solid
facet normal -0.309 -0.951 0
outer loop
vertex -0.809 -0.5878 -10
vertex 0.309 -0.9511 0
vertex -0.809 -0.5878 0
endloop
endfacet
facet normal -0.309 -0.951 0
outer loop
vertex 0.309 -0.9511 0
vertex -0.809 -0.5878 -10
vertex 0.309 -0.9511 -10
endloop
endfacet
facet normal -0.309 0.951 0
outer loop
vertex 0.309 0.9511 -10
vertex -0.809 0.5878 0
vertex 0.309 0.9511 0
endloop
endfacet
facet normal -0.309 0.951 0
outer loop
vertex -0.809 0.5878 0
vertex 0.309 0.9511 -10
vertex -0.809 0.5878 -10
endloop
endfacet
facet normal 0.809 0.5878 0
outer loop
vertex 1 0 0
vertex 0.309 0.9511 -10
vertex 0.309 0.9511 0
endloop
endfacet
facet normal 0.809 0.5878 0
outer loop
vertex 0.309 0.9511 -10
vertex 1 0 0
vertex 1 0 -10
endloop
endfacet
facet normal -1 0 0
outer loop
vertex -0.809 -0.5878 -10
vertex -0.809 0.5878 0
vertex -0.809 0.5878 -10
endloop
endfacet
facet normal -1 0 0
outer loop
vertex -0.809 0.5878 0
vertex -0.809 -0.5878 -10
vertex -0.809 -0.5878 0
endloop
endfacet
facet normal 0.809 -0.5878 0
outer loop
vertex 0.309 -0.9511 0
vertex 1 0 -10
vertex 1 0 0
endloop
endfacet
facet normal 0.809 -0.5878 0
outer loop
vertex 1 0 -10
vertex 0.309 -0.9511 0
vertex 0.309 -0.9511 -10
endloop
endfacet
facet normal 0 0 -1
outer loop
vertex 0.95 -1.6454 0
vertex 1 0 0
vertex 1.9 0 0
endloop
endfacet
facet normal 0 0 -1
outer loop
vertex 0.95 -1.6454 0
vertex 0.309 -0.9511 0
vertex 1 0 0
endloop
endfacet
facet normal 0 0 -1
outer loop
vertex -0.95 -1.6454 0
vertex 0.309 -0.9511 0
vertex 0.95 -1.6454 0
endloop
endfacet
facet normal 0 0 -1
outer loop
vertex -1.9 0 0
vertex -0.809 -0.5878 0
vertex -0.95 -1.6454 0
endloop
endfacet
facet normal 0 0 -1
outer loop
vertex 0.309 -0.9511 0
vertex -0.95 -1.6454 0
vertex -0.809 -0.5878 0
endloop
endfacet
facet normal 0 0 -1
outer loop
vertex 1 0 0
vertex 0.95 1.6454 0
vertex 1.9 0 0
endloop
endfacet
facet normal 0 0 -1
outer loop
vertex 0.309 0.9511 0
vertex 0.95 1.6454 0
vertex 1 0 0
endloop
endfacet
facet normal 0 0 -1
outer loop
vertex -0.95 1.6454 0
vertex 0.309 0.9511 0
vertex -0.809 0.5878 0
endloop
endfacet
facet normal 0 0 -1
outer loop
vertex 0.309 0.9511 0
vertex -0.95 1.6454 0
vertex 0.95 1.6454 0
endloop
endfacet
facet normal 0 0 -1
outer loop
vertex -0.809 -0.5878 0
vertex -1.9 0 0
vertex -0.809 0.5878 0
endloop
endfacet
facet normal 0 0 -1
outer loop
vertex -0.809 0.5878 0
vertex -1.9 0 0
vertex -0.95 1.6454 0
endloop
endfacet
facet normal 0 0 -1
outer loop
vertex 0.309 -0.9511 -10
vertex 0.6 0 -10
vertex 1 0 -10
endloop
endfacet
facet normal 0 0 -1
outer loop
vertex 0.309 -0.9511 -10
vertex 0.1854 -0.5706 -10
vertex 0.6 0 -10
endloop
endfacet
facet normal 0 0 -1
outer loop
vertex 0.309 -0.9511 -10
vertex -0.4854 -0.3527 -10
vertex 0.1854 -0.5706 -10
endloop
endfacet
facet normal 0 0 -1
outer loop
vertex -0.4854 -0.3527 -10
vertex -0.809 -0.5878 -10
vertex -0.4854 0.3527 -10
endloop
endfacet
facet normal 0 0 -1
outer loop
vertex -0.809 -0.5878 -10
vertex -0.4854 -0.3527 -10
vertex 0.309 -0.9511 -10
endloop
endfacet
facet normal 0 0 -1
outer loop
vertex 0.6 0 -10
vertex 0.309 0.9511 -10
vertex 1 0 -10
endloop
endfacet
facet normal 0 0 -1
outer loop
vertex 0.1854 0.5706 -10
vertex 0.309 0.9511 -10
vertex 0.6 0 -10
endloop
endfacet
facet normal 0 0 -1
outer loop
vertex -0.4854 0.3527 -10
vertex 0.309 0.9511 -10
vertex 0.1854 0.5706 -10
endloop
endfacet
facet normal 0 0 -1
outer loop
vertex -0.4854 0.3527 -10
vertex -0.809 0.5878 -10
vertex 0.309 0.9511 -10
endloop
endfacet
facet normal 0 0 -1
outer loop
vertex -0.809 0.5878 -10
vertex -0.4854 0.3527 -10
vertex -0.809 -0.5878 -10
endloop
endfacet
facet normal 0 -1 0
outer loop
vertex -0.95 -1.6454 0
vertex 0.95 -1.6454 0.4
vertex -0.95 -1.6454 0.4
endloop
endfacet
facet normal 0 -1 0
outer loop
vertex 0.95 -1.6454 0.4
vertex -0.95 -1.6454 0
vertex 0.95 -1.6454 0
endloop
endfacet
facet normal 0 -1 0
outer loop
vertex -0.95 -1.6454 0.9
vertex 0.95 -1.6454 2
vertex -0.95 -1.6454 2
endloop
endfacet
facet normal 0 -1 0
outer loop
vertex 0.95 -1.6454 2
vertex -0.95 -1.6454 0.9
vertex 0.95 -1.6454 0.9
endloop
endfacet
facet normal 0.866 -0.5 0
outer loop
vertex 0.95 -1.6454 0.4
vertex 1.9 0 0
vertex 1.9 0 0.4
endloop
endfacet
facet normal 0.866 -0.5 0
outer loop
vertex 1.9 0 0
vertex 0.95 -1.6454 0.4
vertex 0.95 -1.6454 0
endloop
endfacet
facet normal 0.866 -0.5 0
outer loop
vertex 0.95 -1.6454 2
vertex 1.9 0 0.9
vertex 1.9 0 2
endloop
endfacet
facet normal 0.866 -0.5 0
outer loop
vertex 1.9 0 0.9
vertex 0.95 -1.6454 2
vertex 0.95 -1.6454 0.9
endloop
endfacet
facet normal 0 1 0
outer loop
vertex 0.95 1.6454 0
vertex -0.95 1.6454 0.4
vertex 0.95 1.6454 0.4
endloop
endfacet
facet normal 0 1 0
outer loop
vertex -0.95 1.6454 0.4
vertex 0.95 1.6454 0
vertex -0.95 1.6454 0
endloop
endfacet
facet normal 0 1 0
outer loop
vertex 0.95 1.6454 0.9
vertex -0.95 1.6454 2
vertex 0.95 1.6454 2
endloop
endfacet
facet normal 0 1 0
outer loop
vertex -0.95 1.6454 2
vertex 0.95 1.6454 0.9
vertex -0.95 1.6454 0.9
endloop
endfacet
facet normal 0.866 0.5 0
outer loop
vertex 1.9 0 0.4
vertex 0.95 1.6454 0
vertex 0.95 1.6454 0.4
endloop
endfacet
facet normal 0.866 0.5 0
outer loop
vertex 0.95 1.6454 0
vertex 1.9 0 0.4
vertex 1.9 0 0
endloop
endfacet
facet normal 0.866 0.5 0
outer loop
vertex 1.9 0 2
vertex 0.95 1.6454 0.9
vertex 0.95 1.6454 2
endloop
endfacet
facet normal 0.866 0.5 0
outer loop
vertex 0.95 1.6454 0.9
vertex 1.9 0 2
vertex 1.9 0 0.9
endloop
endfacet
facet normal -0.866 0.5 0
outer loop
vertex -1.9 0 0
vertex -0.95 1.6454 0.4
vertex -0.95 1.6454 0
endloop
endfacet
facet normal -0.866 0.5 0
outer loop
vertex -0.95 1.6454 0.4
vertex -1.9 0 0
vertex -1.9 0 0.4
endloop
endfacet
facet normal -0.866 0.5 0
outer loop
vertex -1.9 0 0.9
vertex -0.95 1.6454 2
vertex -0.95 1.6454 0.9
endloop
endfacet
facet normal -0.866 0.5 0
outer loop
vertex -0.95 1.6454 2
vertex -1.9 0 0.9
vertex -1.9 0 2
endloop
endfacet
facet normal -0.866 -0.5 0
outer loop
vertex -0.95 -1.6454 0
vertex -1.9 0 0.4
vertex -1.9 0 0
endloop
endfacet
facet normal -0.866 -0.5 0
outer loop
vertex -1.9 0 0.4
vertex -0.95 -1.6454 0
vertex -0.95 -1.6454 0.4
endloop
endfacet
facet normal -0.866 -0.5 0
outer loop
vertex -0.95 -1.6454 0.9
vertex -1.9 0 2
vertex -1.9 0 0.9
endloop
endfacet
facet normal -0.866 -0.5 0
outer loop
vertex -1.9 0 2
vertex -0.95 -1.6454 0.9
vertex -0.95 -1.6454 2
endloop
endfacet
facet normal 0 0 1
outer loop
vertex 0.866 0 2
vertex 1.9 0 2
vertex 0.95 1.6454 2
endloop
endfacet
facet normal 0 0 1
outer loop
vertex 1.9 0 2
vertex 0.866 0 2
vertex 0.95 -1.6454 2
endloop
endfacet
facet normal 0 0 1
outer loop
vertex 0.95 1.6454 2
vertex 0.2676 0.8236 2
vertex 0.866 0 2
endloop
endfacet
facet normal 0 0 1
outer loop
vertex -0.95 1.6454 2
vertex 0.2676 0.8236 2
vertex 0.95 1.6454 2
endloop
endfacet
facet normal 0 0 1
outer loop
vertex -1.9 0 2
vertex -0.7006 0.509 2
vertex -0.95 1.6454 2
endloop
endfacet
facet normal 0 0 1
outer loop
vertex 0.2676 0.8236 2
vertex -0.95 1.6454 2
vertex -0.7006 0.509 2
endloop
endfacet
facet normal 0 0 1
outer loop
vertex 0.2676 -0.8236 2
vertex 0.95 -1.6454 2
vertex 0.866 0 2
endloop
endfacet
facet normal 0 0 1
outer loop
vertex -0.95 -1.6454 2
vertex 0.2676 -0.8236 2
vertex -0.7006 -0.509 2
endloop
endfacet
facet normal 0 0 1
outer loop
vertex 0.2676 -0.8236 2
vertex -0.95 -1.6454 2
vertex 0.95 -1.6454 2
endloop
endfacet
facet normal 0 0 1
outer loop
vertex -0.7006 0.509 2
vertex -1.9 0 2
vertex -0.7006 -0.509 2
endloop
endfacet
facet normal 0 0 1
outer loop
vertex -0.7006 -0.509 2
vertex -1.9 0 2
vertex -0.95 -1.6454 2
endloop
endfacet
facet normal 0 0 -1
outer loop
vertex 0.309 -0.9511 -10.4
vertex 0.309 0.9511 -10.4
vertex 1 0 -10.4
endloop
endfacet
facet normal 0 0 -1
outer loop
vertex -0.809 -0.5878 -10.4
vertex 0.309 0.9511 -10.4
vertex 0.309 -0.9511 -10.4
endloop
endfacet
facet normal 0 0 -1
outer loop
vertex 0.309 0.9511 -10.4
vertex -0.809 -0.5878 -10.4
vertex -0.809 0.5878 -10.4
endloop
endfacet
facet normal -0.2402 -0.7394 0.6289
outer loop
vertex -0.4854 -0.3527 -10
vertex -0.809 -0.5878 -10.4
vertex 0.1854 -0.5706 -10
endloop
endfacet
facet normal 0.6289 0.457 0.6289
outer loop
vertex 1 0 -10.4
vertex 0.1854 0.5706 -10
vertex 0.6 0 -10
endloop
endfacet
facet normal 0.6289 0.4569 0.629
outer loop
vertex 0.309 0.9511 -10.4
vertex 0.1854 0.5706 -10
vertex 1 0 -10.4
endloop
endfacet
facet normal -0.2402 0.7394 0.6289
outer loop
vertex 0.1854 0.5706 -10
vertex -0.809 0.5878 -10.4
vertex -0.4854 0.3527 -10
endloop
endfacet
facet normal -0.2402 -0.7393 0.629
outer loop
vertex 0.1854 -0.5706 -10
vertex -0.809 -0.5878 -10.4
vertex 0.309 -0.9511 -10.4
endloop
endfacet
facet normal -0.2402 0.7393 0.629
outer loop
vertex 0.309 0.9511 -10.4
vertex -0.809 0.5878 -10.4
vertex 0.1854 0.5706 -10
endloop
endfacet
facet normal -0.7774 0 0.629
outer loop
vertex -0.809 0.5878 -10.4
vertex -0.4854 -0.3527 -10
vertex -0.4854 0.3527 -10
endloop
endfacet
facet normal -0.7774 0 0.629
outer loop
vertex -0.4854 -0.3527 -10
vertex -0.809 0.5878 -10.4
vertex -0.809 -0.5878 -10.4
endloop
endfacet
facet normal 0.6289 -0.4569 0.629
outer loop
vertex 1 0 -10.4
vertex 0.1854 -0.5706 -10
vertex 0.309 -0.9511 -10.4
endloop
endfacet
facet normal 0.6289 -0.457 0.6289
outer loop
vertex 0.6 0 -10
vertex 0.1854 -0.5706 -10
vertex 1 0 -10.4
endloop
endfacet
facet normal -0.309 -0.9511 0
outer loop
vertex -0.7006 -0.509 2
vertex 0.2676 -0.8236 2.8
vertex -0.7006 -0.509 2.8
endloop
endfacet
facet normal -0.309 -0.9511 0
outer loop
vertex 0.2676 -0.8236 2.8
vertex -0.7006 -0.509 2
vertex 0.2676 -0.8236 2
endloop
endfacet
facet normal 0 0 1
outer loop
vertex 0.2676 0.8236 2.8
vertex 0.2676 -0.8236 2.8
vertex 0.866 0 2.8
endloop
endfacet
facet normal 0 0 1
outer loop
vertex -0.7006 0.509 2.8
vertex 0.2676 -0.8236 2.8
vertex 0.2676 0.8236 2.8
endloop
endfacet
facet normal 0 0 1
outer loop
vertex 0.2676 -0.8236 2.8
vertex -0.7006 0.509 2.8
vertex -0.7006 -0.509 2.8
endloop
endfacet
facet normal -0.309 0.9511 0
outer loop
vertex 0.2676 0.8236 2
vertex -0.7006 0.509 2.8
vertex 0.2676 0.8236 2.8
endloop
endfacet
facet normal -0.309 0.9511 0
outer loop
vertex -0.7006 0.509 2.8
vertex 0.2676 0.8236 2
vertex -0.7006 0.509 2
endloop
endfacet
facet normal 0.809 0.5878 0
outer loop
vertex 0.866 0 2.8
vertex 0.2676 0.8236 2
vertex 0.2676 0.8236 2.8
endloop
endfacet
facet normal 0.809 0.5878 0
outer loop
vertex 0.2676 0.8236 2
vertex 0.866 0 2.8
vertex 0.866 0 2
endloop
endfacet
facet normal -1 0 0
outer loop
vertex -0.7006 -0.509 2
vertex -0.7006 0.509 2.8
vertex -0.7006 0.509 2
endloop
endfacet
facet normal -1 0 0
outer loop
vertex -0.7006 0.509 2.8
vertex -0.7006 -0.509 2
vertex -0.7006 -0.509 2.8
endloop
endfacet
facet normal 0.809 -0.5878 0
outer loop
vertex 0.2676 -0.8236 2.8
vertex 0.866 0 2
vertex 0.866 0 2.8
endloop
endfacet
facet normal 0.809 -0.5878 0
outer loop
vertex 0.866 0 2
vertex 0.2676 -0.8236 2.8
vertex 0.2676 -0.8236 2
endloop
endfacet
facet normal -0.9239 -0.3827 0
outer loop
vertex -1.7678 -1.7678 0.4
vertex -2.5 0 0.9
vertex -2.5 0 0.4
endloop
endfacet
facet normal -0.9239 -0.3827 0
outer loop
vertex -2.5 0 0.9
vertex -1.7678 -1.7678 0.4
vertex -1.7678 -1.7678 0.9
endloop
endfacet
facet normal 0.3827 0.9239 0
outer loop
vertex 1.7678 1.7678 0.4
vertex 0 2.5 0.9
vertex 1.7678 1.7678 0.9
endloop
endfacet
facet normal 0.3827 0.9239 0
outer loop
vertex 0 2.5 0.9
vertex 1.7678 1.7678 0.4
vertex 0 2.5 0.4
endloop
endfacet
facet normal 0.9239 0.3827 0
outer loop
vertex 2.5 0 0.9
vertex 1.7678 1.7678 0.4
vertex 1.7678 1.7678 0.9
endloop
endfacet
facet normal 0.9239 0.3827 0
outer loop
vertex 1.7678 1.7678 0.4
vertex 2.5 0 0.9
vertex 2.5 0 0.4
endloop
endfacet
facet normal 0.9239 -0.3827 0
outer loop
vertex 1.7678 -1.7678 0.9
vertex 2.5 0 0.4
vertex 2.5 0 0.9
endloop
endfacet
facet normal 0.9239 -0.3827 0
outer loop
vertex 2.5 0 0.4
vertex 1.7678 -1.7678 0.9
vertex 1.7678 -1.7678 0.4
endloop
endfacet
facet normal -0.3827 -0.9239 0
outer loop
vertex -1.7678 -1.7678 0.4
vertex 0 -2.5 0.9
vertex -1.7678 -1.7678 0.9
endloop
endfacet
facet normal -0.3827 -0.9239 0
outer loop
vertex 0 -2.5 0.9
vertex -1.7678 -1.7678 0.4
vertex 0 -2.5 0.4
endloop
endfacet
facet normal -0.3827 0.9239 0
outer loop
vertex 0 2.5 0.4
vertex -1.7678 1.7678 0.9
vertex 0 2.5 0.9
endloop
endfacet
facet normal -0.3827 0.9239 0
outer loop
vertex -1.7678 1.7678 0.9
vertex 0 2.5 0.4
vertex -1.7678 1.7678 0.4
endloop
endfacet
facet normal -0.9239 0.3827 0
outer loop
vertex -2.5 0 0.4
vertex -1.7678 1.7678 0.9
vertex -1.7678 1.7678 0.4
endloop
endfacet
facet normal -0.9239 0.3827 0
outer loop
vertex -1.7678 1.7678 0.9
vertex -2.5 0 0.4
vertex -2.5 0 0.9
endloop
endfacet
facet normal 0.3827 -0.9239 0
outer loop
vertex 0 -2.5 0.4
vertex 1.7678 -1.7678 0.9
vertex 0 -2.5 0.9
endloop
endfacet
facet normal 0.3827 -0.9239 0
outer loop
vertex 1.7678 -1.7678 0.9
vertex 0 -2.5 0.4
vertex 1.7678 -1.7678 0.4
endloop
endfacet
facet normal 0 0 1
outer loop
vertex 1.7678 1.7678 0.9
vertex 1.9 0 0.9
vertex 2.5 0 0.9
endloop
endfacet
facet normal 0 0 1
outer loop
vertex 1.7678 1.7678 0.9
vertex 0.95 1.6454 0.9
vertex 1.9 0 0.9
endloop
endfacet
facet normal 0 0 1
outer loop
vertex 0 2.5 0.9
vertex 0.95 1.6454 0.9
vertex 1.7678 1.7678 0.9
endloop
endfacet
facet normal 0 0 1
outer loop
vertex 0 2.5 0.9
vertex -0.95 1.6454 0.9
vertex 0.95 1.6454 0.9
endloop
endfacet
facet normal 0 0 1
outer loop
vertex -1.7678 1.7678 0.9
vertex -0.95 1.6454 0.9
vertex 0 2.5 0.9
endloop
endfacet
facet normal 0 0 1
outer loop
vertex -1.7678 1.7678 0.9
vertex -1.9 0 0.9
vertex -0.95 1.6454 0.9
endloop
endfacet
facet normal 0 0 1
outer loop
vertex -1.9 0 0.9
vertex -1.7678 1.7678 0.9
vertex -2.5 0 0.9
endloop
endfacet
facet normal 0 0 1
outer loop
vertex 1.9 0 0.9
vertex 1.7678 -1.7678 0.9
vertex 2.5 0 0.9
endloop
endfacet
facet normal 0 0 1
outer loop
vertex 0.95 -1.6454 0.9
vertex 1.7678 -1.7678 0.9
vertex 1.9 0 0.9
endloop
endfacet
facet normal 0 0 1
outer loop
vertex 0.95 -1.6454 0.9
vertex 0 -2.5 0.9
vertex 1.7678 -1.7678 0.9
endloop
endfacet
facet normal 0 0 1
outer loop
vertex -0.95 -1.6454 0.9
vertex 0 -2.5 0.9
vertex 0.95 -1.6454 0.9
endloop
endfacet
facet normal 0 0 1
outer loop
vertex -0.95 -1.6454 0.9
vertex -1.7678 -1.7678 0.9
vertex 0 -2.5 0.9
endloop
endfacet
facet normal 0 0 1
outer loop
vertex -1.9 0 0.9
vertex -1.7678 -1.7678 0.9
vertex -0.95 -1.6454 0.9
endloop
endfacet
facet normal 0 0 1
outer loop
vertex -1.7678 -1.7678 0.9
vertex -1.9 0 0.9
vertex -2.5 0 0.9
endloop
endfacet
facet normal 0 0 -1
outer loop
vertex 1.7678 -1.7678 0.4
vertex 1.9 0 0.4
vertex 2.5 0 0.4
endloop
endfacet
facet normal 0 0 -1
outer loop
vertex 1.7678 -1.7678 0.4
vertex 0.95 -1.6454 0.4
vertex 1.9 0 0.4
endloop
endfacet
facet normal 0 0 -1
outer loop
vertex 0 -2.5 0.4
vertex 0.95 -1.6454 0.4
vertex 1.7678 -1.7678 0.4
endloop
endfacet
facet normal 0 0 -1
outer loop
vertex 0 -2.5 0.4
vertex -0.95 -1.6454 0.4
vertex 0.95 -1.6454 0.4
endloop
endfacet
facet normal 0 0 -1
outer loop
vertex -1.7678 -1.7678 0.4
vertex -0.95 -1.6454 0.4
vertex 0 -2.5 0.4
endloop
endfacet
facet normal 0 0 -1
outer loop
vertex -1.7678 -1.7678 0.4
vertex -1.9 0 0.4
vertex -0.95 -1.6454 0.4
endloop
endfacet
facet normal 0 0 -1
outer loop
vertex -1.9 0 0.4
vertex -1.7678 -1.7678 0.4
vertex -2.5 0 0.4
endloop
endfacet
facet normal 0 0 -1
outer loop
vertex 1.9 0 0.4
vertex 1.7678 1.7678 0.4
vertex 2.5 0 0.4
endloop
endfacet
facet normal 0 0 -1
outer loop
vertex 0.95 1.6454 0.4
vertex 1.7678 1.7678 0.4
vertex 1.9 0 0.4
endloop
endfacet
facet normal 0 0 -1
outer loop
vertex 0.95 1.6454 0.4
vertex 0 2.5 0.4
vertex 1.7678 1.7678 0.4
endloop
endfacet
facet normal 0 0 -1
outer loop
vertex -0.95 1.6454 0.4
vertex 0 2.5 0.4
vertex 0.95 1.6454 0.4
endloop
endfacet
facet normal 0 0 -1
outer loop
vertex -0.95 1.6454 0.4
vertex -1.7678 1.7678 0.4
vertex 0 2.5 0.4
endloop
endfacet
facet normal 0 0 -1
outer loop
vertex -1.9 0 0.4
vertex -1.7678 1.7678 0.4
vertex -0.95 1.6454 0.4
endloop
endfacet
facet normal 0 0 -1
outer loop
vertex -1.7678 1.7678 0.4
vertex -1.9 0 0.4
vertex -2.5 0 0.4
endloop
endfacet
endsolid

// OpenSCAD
// Parameters
nominal_diameter_mm = 2.0; //[1.0:4.0:0.1]
length_mm = 10.0; //[5.0:20.0:0.5]
head_diameter_mm = 3.8; //[2.0:7.6:0.1]
head_height_mm = 2.0; //[1.0:4.0:0.1]
socket_hex_af_mm = 1.5; //[0.8:3.0:0.05]
socket_depth_mm = 1.2; //[0.6:2.4:0.05]
threaded_length_mm = 10.0; //[0.0:20.0:0.5]
thread_pitch_mm = 0.4; //[0.2:0.8:0.05]
thread_major_diameter_mm = 2.0; //[1.0:4.0:0.1]
thread_minor_diameter_mm = 1.6; //[0.8:3.2:0.1]
head_to_shank_chamfer_h_mm = 0.4; //[0.2:0.8:0.05]
shaft_end_chamfer_h_mm = 0.4; //[0.2:1.0:0.05]
washer_outer_diameter_mm = 5.0; //[2.5:10.0:0.1]
washer_thickness_mm = 0.5; //[0.25:1.5:0.05]
washer_hole_diameter_mm = 2.2; //[1.2:4.4:0.1]
overlap_mm = 0.8; //[0.5:2.0:0.1]

// Screw and Washer - complete geometry
module screw_and_washer() {
  color("DimGray") {
    // Screw Shaft
    translate([0, 0, -length_mm/2])
      cylinder(h=length_mm, r=nominal_diameter_mm/2, center=true);

    // Cap Head
    translate([0, 0, head_height_mm/2])
      cylinder(h=head_height_mm, r=head_diameter_mm/2, center=true);

    // Head to Shank Chamfer
    translate([0, 0, -head_to_shank_chamfer_h_mm/2 + overlap_mm/2])
      cylinder(h=head_to_shank_chamfer_h_mm, r1=head_diameter_mm/2, r2=nominal_diameter_mm/2, center=true);

    // Shaft End Chamfer
    translate([0, 0, -length_mm + shaft_end_chamfer_h_mm/2 - overlap_mm/2])
      cylinder(h=shaft_end_chamfer_h_mm, r1=nominal_diameter_mm/2, r2=nominal_diameter_mm/2 - shaft_end_chamfer_h_mm, center=true);

    // Thread Representation
    for (i = [0:2]) {
      translate([0, 0, -length_mm + threaded_length_mm*(i+1)/3])
        cylinder(h=thread_pitch_mm/3, r=thread_major_diameter_mm/2, center=true);
    }

    // Hex Socket
    translate([0, 0, head_height_mm - socket_depth_mm/2 + overlap_mm/2])
      rotate([0, 0, 0])
      cylinder(h=socket_depth_mm + overlap_mm, r=socket_hex_af_mm/(2*cos(30)), center=true);
  }

  // Washer
  color("Silver") {
    difference() {
      translate([0, 0, washer_thickness_mm/2 + overlap_mm/2])
        cylinder(h=washer_thickness_mm, r=washer_outer_diameter_mm/2, center=true);
      translate([0, 0, washer_thickness_mm/2 + overlap_mm/2])
        cylinder(h=washer_thickness_mm + 2*overlap_mm, r=washer_hole_diameter_mm/2, center=true);
    }
  }
}

// Assembly
module assembly() {
  screw_and_washer();
}

assembly();
